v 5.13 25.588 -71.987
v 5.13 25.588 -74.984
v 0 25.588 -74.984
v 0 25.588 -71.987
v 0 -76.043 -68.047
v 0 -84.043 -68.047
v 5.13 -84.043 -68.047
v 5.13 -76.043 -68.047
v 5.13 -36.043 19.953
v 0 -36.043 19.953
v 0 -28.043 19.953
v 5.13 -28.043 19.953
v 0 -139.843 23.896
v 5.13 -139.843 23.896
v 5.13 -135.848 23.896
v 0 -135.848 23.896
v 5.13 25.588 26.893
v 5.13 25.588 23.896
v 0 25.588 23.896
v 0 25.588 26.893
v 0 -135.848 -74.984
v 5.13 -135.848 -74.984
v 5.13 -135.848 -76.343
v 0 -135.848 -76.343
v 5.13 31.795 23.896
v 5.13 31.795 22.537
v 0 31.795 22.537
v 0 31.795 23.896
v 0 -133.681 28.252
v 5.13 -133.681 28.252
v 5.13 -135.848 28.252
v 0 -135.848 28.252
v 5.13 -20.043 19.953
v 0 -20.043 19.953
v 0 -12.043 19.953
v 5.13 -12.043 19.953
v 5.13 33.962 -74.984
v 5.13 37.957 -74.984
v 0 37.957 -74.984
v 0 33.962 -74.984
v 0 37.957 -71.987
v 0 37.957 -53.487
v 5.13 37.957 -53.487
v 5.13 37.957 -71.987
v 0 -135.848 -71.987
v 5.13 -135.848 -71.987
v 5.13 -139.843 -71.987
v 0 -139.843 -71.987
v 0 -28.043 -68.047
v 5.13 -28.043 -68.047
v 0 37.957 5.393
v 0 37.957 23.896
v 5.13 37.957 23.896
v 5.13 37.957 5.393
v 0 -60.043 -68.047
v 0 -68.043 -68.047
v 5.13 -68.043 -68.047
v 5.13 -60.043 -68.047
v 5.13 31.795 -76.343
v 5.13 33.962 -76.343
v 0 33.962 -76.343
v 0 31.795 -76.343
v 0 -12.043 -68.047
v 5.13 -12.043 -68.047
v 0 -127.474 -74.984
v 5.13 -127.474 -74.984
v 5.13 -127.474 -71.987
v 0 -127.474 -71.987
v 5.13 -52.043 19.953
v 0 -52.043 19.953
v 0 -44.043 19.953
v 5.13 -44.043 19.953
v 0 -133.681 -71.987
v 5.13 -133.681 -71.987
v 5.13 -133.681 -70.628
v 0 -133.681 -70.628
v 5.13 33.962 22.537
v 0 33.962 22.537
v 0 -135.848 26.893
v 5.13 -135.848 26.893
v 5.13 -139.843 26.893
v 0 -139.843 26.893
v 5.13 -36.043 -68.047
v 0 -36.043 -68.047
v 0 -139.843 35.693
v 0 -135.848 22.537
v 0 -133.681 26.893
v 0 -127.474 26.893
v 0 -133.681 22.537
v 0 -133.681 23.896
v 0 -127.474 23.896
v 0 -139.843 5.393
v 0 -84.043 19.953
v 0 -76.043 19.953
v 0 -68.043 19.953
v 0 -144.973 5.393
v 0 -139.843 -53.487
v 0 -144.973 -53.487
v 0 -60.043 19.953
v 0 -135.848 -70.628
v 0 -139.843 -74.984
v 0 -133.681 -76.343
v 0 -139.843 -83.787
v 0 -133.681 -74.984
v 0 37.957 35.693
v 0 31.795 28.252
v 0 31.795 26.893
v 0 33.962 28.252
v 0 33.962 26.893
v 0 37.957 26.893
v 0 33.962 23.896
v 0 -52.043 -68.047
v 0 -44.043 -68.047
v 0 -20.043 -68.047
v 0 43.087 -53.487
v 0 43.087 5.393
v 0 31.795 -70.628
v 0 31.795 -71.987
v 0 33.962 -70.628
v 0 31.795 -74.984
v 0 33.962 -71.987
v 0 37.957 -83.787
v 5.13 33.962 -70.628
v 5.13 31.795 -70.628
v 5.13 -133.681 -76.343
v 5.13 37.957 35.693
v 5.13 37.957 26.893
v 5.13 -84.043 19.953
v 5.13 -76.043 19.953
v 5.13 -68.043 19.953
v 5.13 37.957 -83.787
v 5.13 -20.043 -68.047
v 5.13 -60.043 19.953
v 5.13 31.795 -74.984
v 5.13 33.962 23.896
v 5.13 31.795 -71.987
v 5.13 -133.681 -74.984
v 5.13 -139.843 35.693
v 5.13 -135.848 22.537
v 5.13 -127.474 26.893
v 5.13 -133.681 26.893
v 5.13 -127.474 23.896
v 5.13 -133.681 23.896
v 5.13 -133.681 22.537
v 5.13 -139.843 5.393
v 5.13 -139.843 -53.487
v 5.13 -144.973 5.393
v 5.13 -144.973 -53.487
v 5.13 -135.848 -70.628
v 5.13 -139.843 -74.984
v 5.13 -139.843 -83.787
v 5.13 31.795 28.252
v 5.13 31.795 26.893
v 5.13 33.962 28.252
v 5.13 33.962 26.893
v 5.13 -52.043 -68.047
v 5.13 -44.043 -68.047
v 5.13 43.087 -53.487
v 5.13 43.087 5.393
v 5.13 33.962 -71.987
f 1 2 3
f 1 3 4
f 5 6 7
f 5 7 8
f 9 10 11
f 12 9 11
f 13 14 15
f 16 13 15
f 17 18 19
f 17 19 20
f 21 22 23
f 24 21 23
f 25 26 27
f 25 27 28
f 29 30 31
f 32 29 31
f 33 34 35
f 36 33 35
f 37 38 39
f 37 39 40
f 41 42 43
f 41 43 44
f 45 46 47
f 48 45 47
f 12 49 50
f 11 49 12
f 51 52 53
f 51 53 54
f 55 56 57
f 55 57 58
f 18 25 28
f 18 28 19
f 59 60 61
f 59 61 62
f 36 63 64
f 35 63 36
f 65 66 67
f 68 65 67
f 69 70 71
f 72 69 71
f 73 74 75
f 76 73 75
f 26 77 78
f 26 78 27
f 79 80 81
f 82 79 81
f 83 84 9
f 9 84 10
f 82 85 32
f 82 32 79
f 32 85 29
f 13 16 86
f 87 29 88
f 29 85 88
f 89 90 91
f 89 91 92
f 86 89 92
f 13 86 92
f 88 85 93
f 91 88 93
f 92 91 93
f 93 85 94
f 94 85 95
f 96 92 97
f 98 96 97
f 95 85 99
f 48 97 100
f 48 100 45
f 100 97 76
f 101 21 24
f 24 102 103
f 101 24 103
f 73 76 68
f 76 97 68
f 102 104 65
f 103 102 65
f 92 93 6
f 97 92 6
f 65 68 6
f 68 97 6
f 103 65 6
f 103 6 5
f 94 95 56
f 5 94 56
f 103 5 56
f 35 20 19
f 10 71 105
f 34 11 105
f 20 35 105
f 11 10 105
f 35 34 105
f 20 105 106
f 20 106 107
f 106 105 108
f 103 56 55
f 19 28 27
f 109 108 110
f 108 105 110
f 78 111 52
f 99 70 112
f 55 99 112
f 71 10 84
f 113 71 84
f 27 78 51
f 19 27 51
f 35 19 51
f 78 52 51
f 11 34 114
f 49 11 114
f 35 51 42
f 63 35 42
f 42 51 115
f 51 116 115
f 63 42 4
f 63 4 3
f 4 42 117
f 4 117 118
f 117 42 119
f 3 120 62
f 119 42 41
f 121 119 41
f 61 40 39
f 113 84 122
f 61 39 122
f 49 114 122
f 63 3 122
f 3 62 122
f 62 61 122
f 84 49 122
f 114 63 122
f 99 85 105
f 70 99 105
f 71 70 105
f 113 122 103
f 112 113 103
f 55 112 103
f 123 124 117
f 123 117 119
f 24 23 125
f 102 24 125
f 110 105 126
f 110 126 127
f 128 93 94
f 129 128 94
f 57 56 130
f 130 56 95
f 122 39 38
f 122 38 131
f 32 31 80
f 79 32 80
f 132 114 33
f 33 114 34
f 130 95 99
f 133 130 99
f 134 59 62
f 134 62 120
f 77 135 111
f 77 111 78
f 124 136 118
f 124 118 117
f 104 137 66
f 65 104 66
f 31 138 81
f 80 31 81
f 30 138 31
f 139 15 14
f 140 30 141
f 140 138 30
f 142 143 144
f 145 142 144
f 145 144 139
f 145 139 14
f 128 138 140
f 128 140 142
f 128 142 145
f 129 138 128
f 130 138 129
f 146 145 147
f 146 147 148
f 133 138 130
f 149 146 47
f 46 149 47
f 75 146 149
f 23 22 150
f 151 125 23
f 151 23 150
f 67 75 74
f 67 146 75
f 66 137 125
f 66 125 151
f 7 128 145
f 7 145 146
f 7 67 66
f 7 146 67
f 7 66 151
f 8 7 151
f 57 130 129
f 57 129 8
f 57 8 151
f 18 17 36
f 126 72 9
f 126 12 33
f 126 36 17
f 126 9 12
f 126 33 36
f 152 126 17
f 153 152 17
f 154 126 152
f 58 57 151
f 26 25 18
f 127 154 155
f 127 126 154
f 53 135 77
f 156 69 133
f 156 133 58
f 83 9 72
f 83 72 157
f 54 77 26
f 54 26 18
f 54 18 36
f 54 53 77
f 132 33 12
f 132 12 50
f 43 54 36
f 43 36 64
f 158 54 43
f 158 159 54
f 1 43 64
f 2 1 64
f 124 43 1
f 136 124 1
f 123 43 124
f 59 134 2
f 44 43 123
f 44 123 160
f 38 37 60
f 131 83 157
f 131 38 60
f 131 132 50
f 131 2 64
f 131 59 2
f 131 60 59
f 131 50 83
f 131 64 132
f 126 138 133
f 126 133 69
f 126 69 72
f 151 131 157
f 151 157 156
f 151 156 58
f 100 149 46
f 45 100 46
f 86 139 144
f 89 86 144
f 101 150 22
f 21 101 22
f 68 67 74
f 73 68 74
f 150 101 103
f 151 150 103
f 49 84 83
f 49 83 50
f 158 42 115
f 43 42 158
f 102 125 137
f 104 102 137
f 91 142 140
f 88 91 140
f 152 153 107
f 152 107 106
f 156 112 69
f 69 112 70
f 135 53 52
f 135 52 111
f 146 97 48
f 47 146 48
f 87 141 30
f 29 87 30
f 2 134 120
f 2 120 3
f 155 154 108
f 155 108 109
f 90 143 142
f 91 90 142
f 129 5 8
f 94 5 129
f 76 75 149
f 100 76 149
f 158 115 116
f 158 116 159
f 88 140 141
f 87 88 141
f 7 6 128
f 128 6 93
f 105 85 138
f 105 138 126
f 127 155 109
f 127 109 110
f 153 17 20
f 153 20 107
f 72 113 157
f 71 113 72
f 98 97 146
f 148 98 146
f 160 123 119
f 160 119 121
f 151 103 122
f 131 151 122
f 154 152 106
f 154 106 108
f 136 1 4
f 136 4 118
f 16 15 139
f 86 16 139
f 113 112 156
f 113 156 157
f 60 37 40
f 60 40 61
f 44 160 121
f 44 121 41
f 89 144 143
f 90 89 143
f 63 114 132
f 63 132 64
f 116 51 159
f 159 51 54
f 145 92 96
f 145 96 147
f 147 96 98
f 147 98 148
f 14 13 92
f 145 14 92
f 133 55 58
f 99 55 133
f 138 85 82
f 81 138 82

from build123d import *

# Parameters (mm, degrees)
SKETCH1_W           = 119.48
SKETCH1_H           = 177.8
BOSS_EXTRUDE1_DEPTH = 5.13
CUT_EXTRUDE1_DEPTH  = 5.13
SKETCH3_W           = 88
SKETCH3_H           = 8
VENTS_DEPTH         = 5.13
VENTS_PATTERN_COUNT = 5
VENTS_PATTERN_PITCH = 16
SKETCH4_W           = 5.13
SKETCH4_H           = 58.88
BOSS_EXTRUDE2_DEPTH = 5.13
SKETCH5_W           = 5.13
SKETCH5_H           = 58.88
BOSS_EXTRUDE3_DEPTH = 5.13


with BuildPart() as part:
    # Sketch1 → Boss-Extrude1 (new body)
    with BuildSketch(Plane(origin=(0, 0, 0), x_dir=(0, 0, -1), z_dir=(1, 0, 0))):
        with Locations((24.047197546, -50.943101868)):
            Rectangle(SKETCH1_W, SKETCH1_H)
    extrude(amount=BOSS_EXTRUDE1_DEPTH)

    # Sketch2 → Cut-Extrude1 (cut)
    with BuildSketch(Plane(origin=(5.13, 0, 0), x_dir=(0, 0, -1), z_dir=(1, 0, 0))):
        Polygon((-26.892802454, 37.956898132), (-23.895802454, 37.956898132), (-23.895802454, 33.961898132), (-22.536802454, 33.961898132), (-22.536802454, 31.794898132), (-23.895802454, 31.794898132), (-23.895802454, 25.587898132), (-26.892802454, 25.587898132), (-26.892802454, 31.794898132), (-28.251802454, 31.794898132), (-28.251802454, 33.961898132), (-26.892802454, 33.961898132), align=None)
        Polygon((71.987197546, 33.961898132), (71.987197546, 37.956898132), (74.984197546, 37.956898132), (74.984197546, 33.961898132), (76.343197546, 33.961898132), (76.343197546, 31.794898132), (74.984197546, 31.794898132), (74.984197546, 25.587898132), (71.987197546, 25.587898132), (71.987197546, 31.794898132), (70.628197546, 31.794898132), (70.628197546, 33.961898132), align=None)
        Polygon((76.343197546, -133.681101868), (74.984197546, -133.681101868), (74.984197546, -127.474101868), (71.987197546, -127.474101868), (71.987197546, -133.681101868), (70.628197546, -133.681101868), (70.628197546, -135.848101868), (71.987197546, -135.848101868), (71.987197546, -139.843101868), (74.984197546, -139.843101868), (74.984197546, -135.848101868), (76.343197546, -135.848101868), align=None)
        Polygon((-26.892802454, -139.843101868), (-23.895802454, -139.843101868), (-23.895802454, -135.848101868), (-22.536802454, -135.848101868), (-22.536802454, -133.681101868), (-23.895802454, -133.681101868), (-23.895802454, -127.474101868), (-26.892802454, -127.474101868), (-26.892802454, -133.681101868), (-28.251802454, -133.681101868), (-28.251802454, -135.848101868), (-26.892802454, -135.848101868), align=None)
    extrude(amount=-CUT_EXTRUDE1_DEPTH, mode=Mode.SUBTRACT)

    # Sketch3 → Vents (cut)
    with BuildSketch(Plane.ZY):
        with Locations((-24.047197546, -16.043101868)):
            Rectangle(SKETCH3_W, SKETCH3_H)
    vents = extrude(amount=-VENTS_DEPTH, mode=Mode.SUBTRACT)

    # Vents pattern: Vents ×5
    with Locations(*[(0, -i * VENTS_PATTERN_PITCH, 0) for i in range(1, VENTS_PATTERN_COUNT)]):
        add(vents, mode=Mode.SUBTRACT)

    # Sketch4 → Boss-Extrude2 (add)
    with BuildSketch(Plane(origin=(0, 37.956898132, 0), x_dir=(1, 0, 0), z_dir=(0, 1, 0))):
        with Locations((2.565, 24.047197546)):
            Rectangle(SKETCH4_W, SKETCH4_H)
    extrude(amount=BOSS_EXTRUDE2_DEPTH)

    # Sketch5 → Boss-Extrude3 (add)
    with BuildSketch(Plane.XZ.offset(139.843101868)):
        with Locations((2.565, -24.047197546)):
            Rectangle(SKETCH5_W, SKETCH5_H)
    extrude(amount=BOSS_EXTRUDE3_DEPTH)


solid = part.part
